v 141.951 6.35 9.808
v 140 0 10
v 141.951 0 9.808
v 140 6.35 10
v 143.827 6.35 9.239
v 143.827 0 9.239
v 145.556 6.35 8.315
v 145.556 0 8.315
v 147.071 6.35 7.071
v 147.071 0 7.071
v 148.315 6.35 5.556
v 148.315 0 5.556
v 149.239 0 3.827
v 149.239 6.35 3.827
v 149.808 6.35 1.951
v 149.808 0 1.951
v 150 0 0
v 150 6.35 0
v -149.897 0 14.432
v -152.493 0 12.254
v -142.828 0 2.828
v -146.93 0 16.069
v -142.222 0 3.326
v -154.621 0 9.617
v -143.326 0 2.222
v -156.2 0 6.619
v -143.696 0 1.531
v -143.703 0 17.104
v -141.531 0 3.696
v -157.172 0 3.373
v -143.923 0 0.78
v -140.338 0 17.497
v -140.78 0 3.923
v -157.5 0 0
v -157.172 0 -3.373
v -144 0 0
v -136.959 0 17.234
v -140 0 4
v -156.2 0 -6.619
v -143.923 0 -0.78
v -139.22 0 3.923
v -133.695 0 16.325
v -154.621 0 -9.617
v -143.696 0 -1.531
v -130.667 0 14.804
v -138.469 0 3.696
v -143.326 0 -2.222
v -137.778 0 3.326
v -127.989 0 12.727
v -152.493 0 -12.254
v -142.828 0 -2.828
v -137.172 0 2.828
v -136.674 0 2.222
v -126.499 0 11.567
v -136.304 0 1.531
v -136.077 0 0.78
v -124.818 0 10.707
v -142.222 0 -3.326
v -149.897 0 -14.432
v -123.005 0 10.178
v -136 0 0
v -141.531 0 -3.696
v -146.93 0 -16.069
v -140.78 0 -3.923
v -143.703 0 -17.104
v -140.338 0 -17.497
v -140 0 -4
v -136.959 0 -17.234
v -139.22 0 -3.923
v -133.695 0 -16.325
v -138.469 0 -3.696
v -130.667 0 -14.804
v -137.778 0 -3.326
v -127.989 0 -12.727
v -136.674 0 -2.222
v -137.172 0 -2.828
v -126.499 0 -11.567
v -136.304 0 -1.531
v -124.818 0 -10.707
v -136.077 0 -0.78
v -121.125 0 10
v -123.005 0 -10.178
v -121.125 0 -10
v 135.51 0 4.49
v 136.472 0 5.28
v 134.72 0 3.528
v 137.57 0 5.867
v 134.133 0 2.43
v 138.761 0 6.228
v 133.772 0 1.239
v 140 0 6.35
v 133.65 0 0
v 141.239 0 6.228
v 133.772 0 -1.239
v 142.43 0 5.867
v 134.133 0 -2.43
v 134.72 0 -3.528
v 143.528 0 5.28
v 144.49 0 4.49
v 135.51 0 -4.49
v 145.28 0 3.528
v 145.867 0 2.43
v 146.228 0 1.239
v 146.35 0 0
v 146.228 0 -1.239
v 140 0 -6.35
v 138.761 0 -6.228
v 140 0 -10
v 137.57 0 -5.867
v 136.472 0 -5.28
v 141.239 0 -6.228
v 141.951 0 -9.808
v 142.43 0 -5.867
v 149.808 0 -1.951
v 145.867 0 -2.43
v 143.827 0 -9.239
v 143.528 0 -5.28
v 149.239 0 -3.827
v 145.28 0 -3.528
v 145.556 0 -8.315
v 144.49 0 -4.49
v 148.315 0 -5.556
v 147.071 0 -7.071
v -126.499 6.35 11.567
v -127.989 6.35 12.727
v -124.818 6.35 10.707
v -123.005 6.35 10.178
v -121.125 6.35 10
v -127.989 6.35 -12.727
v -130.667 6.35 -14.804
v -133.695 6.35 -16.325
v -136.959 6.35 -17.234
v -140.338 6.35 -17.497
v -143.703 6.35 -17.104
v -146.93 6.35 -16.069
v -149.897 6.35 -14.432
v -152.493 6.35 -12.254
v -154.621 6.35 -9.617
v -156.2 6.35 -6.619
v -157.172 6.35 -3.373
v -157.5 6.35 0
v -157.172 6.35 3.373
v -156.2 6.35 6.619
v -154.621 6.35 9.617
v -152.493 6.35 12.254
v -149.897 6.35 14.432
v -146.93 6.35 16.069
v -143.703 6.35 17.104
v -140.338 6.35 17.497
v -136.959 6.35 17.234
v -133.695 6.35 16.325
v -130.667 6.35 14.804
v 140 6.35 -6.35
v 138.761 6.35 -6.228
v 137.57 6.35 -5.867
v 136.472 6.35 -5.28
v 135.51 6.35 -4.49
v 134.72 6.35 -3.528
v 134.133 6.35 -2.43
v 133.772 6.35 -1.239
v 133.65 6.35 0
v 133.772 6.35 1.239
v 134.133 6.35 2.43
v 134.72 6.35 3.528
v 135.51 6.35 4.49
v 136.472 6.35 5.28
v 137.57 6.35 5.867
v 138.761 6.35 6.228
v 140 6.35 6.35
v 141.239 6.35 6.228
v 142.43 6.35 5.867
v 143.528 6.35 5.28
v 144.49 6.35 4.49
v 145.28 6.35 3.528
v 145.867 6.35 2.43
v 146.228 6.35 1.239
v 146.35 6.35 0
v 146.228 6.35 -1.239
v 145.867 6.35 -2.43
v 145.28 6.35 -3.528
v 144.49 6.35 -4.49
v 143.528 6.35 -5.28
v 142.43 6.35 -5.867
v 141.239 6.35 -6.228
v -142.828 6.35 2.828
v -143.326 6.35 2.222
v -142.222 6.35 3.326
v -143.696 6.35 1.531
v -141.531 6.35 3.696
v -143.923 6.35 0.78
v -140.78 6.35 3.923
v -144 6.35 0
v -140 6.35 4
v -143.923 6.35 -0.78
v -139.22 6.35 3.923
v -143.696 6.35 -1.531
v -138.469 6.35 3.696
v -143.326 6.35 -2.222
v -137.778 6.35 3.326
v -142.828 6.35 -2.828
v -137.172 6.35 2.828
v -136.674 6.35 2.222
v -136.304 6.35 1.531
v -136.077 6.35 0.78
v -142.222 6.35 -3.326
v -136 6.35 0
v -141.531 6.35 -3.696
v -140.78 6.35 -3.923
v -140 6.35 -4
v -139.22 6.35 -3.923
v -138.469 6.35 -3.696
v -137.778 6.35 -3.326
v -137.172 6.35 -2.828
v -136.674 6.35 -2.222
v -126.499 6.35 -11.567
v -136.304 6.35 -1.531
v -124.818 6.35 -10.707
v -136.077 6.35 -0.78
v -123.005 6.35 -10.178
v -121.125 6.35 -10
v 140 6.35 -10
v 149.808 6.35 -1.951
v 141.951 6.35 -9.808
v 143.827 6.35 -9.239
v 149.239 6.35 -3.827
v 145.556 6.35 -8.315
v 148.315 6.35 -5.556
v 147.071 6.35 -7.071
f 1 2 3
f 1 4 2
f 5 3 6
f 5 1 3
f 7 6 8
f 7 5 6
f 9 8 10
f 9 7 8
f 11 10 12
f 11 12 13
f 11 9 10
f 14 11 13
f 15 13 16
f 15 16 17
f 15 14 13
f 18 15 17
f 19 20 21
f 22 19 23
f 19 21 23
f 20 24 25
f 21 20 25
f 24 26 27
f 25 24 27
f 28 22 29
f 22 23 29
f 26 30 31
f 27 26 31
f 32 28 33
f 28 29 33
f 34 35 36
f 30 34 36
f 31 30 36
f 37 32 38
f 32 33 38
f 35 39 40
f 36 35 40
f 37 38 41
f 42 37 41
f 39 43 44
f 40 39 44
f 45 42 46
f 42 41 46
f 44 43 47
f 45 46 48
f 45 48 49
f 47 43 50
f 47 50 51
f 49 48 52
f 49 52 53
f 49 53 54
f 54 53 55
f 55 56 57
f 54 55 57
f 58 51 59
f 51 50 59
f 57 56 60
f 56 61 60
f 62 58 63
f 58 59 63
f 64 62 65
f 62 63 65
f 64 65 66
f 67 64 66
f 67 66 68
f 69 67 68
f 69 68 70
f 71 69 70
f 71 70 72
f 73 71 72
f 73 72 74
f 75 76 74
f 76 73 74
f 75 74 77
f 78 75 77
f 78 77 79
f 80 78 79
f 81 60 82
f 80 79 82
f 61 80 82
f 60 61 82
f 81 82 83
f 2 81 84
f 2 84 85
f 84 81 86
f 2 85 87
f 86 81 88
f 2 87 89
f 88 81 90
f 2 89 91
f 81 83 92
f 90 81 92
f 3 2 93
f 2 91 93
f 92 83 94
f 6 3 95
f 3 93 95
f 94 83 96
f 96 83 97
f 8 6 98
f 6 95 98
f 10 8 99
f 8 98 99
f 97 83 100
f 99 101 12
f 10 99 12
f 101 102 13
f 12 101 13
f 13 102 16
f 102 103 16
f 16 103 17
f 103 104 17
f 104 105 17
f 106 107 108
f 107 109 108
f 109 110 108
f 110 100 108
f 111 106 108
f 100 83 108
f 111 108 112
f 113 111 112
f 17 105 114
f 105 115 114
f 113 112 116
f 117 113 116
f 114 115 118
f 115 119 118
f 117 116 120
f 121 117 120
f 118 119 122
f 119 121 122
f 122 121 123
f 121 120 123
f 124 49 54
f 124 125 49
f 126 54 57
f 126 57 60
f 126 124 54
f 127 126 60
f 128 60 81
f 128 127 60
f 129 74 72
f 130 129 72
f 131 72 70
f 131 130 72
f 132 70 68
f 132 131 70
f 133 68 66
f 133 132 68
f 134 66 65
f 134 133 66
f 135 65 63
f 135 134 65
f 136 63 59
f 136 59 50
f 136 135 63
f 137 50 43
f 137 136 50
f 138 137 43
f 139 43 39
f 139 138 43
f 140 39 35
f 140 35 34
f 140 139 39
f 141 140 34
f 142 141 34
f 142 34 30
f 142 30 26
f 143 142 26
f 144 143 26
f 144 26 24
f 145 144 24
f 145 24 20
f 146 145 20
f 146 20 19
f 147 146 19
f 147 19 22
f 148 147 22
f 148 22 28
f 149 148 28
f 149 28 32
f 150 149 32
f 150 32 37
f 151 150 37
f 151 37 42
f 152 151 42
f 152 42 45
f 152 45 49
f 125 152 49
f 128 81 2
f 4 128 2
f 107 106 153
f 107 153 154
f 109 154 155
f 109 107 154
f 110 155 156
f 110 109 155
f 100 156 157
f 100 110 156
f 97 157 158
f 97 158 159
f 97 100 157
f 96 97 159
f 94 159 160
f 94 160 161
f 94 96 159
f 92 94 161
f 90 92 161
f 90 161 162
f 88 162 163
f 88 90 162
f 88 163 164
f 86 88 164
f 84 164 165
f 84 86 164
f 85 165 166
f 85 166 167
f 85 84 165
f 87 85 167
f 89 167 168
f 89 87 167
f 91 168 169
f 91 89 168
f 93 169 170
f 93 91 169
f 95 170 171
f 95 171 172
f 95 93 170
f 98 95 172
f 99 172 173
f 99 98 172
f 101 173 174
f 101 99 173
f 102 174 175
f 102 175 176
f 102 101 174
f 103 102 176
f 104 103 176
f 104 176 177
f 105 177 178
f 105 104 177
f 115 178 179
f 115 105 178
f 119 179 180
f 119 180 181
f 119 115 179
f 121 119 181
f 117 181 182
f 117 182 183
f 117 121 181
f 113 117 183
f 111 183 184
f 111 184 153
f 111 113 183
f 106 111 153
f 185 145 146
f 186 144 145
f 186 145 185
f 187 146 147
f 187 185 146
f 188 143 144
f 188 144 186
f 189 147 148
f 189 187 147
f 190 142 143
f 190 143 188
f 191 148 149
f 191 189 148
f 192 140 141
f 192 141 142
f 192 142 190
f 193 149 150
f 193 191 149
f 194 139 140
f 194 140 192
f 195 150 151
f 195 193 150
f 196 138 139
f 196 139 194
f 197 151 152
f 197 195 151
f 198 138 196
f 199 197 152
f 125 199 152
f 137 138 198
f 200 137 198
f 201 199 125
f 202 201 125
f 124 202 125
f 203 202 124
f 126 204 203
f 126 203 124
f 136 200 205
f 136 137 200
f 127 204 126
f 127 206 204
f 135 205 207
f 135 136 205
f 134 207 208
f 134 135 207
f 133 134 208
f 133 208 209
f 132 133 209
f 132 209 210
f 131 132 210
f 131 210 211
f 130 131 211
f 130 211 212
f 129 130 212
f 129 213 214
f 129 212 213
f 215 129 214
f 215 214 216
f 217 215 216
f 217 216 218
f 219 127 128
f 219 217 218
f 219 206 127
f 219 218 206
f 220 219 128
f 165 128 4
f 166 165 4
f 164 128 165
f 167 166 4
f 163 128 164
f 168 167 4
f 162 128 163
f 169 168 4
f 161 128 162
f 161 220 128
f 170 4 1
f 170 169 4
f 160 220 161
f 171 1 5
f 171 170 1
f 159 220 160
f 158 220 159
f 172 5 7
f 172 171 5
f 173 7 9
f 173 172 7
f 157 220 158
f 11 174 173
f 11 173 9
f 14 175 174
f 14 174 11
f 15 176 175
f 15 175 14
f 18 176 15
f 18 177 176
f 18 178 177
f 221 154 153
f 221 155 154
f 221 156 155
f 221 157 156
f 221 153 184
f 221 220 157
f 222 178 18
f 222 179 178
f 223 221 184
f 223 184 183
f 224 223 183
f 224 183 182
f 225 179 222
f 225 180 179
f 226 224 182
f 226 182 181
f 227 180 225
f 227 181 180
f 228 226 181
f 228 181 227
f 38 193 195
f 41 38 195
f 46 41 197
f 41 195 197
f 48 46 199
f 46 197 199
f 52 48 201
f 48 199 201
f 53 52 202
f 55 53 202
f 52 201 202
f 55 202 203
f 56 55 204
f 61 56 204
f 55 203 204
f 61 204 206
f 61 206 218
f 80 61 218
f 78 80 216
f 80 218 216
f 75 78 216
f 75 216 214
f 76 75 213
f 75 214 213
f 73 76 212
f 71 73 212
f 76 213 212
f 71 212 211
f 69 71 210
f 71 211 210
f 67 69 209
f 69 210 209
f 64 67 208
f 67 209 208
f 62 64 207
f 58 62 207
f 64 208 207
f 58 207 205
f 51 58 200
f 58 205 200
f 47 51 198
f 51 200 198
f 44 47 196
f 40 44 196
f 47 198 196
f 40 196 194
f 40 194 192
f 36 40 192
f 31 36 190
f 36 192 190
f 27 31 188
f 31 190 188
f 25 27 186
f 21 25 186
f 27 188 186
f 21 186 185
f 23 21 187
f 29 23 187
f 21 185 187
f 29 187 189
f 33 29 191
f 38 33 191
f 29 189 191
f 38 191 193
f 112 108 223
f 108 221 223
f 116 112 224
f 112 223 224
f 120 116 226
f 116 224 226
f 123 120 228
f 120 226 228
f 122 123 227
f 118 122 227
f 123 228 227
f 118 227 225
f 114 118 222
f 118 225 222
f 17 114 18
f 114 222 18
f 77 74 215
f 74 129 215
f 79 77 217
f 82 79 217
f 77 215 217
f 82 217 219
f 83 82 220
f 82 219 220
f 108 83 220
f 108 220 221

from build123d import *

# Parameters (mm, degrees)
SKETCH1_W           = 300
SKETCH1_H           = 20
BOSS_EXTRUDE1_DEPTH = 6.35
SKETCH2_R           = 6.35
CUT_EXTRUDE1_DEPTH  = 6.35
CONG_1_R            = 10
SKETCH3_R           = 17.5
SKETCH3_R_2         = 4
BOSS_EXTRUDE2_DEPTH = 6.35
FILLET2_R           = 10


with BuildPart() as part:
    # Sketch1 → Boss-Extrude1 (new body)
    with BuildSketch(Plane(origin=(0, 0, 0), x_dir=(1, 0, 0), z_dir=(0, 1, 0))):
        Rectangle(SKETCH1_W, SKETCH1_H)
    extrude(amount=BOSS_EXTRUDE1_DEPTH)

    # Sketch2 → Cut-Extrude1 (cut)
    with BuildSketch(Plane(origin=(0, 0, 0), x_dir=(-1, 0, 0), z_dir=(0, -1, 0))):
        with Locations(Location((140, 0, 0), (0, 0, 90))):
            Circle(SKETCH2_R)
    cut_extrude1 = extrude(amount=-CUT_EXTRUDE1_DEPTH, mode=Mode.SUBTRACT)

    # Mirror1: Cut-Extrude1 across plane
    add(cut_extrude1.mirror(Plane(origin=(0, 0, 0), x_dir=(0, 0, 1), z_dir=(1, 0, 0))), mode=Mode.SUBTRACT)

    # Congé1
    cong_1_edges = [part.edges().sort_by_distance(p)[0] for p in [
        (-150, 3.175, -10),
        (-150, 3.175, 10),
        (150, 3.175, -10),
        (150, 3.175, 10),
    ]]
    fillet(cong_1_edges, radius=CONG_1_R - 0.0001)  # a hair under: the kernel refuses the full size

    # Sketch3 → Boss-Extrude2 (add)
    with BuildSketch(Plane(origin=(0, 6.35, 0), x_dir=(1, 0, 0), z_dir=(0, 1, 0))):
        with Locations((-140, 0)):
            Circle(SKETCH3_R)
        with Locations(Location((-140, 0, 0), (0, 0, 270))):
            Circle(SKETCH3_R_2, mode=Mode.SUBTRACT)
    extrude(amount=-BOSS_EXTRUDE2_DEPTH)

    # Fillet2
    fillet2_edges = [part.edges().sort_by_distance(p)[0] for p in [
        (-125.638593384, 3.175, 10),
        (-125.638593384, 3.175, -10),
    ]]
    fillet(fillet2_edges, radius=FILLET2_R)


solid = part.part
